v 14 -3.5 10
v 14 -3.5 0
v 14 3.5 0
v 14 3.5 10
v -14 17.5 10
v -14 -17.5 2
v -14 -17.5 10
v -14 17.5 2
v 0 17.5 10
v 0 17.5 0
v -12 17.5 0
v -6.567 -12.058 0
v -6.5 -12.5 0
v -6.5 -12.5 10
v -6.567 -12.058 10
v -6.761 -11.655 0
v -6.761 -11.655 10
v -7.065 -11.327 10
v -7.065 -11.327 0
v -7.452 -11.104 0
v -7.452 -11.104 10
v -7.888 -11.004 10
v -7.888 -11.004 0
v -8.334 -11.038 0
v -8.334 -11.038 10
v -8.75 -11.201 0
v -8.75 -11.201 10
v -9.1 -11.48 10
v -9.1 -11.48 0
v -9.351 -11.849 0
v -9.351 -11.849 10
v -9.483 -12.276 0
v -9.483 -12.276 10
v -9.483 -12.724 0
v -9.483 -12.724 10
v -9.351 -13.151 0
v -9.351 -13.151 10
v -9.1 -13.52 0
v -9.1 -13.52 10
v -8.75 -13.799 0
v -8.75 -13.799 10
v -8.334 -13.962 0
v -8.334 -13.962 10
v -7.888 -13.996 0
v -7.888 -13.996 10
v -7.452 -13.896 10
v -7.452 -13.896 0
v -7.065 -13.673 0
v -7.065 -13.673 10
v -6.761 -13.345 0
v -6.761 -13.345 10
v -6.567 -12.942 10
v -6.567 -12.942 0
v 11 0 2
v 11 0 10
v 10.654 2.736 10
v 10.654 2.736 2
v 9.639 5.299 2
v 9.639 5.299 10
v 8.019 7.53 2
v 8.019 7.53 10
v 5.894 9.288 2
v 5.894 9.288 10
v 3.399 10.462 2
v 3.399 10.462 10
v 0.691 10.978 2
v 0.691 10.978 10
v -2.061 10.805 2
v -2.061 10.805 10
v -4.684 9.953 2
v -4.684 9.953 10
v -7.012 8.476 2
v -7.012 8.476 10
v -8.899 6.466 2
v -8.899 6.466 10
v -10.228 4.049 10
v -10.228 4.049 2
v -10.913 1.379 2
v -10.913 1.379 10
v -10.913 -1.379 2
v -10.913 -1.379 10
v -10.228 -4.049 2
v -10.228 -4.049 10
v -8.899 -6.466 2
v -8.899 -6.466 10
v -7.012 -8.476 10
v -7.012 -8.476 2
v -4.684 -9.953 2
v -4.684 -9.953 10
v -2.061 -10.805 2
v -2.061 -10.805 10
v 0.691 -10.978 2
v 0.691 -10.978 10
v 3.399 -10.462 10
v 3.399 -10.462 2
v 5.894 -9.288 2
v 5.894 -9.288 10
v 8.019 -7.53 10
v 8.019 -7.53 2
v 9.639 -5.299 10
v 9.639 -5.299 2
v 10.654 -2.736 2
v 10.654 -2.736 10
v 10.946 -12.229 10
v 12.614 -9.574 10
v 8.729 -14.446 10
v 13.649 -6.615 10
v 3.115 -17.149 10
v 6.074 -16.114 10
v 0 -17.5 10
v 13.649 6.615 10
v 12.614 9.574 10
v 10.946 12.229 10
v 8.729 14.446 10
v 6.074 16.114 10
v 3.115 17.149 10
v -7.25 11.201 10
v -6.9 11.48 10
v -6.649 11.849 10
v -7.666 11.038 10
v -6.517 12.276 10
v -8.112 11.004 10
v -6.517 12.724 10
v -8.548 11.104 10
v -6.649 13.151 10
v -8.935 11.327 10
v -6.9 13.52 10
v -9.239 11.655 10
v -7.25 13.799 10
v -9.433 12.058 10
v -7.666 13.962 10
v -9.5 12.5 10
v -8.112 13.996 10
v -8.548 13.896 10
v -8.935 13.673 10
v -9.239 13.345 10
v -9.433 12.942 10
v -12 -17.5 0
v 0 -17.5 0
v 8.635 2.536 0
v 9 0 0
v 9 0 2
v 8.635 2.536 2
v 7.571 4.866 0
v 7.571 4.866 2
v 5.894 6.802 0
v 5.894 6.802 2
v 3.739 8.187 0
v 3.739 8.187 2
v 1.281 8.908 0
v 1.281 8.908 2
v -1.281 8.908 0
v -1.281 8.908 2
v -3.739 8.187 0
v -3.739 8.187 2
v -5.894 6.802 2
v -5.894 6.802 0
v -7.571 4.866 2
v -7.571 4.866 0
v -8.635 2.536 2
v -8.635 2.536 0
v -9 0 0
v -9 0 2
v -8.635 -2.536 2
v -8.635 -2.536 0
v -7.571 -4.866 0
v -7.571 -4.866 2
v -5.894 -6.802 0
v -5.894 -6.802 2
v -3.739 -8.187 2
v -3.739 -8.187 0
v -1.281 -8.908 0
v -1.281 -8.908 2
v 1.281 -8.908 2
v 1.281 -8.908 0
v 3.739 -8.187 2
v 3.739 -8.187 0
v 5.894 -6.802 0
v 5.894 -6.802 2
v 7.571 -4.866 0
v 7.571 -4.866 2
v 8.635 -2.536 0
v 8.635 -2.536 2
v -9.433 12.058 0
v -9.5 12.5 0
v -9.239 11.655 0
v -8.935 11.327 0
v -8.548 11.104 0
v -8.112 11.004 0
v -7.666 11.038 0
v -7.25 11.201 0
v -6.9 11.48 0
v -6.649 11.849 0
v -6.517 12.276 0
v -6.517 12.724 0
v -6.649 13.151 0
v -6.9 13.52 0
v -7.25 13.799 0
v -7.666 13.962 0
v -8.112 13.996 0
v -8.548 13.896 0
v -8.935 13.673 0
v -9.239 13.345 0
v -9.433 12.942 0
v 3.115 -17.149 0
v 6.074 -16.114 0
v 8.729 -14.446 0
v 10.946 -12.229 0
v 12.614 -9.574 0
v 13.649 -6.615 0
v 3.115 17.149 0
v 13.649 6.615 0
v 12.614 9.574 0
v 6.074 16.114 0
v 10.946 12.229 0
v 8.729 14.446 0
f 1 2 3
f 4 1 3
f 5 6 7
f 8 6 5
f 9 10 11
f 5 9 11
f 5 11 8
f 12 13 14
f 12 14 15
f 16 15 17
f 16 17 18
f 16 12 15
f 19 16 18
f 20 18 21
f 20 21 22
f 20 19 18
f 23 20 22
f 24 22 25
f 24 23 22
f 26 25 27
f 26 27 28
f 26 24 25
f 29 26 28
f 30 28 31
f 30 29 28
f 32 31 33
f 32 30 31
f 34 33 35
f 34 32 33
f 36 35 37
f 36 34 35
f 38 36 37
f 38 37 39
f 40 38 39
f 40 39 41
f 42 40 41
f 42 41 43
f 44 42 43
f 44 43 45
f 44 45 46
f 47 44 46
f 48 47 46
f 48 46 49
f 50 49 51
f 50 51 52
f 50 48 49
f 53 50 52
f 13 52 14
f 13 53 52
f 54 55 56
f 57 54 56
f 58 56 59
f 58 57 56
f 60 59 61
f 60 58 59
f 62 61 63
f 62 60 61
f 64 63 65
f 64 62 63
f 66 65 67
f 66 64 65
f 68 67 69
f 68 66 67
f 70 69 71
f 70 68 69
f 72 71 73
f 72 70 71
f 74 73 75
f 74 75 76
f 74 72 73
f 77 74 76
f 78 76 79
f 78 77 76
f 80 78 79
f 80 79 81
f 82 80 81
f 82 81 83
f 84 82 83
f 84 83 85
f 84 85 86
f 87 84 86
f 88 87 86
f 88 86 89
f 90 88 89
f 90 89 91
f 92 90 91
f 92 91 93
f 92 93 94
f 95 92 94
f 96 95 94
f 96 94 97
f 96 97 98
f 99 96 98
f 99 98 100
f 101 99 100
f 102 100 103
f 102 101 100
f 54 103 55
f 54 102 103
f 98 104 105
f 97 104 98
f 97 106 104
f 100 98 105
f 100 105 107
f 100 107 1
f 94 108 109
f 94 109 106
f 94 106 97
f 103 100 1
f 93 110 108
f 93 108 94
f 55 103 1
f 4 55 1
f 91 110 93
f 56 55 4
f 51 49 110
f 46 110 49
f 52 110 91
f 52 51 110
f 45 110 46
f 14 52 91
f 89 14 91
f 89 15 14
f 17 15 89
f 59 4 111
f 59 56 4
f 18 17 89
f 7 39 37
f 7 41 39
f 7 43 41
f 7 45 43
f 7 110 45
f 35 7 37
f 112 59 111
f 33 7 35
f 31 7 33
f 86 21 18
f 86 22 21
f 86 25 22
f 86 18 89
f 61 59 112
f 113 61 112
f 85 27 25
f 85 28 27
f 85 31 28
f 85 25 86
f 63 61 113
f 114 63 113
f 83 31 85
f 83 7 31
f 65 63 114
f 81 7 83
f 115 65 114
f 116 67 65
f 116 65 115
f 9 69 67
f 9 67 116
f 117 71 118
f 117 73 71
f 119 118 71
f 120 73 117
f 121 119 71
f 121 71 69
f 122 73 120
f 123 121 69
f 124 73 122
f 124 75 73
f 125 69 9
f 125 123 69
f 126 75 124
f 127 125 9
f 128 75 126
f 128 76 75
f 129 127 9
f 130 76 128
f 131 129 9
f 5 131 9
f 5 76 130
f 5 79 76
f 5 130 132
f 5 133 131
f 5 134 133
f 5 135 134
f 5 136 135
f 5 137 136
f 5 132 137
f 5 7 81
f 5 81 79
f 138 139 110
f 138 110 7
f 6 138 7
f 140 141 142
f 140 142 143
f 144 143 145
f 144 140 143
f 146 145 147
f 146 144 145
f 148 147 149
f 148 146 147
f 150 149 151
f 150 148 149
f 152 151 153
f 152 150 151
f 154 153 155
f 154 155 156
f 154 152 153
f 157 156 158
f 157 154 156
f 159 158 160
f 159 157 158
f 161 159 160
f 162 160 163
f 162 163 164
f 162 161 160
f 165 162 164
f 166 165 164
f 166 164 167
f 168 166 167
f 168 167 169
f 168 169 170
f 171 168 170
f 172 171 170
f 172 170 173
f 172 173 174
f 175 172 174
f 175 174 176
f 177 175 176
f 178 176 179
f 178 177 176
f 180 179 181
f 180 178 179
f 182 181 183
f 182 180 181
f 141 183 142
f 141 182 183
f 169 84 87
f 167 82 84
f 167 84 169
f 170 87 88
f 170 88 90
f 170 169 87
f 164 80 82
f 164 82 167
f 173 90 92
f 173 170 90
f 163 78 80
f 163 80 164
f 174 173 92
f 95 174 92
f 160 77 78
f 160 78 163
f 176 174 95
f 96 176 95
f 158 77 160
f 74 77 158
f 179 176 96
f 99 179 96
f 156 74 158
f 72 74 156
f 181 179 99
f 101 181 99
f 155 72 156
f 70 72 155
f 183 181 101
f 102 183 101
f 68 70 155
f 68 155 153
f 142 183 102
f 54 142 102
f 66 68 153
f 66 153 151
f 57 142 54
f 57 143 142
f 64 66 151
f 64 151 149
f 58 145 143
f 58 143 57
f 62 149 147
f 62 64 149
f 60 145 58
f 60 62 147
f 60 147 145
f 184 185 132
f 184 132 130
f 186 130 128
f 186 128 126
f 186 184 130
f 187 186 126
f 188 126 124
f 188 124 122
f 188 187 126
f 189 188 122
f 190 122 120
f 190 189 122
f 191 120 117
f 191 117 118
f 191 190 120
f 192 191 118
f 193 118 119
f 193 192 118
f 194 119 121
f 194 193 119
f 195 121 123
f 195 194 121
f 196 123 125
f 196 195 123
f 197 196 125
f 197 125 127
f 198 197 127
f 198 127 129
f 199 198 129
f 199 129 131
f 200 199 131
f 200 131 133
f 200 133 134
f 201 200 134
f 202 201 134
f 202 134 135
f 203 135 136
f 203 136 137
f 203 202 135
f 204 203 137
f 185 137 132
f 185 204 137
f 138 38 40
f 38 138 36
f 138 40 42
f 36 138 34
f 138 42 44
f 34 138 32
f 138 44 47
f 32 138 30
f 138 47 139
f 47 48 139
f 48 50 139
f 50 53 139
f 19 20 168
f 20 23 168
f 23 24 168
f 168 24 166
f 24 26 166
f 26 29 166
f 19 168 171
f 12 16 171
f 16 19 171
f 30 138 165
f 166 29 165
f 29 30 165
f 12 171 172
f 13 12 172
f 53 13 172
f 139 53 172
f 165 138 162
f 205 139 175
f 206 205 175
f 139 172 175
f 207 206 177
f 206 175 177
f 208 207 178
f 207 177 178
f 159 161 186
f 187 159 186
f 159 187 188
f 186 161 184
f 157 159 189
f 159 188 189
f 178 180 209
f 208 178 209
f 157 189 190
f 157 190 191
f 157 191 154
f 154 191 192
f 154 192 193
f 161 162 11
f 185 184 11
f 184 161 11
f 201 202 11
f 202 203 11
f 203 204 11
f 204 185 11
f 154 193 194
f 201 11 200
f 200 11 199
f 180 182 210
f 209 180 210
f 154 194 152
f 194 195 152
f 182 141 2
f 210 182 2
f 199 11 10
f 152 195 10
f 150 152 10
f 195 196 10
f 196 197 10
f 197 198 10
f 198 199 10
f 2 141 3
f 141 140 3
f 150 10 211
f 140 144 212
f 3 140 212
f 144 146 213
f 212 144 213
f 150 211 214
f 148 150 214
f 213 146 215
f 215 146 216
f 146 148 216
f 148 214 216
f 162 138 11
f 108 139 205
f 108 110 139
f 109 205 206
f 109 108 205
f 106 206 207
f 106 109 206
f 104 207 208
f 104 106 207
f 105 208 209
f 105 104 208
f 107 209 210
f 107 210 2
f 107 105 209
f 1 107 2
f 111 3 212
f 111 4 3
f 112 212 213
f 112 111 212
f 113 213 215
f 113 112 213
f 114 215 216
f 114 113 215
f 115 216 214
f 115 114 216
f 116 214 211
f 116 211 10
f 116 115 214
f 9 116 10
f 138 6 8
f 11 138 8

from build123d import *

# Parameters (mm, degrees)
CROQUIS1_W              = 35
CROQUIS1_H              = 28
CROQUIS1_R              = 11
CROQUIS1_R_2            = 1.5
SALIENTE_EXTRUIR1_DEPTH = 10
CROQUIS2_R              = 11
CROQUIS2_R_2            = 9
SALIENTE_EXTRUIR2_DEPTH = 2
REDONDEO1_R             = 14
CHAFL_N1_SIZE           = 2


with BuildPart() as part:
    # Croquis1 → Saliente-Extruir1 (new body)
    with BuildSketch(Plane(origin=(0, 0, 0), x_dir=(0, 1, 0), z_dir=(0, 0, 1))):
        Rectangle(CROQUIS1_W, CROQUIS1_H)
        with Locations(Location((0, 0, 0), (0, 0, 270))):
            Circle(CROQUIS1_R, mode=Mode.SUBTRACT)
        with Locations(Location((-12.5, 8, 0), (0, 0, 270))):
            Circle(CROQUIS1_R_2, mode=Mode.SUBTRACT)
        with Locations(Location((12.5, 8, 0), (0, 0, 90))):
            Circle(CROQUIS1_R_2, mode=Mode.SUBTRACT)
    extrude(amount=SALIENTE_EXTRUIR1_DEPTH)

    # Croquis2 → Saliente-Extruir2 (add)
    with BuildSketch(Plane(origin=(0, 0, 0), x_dir=(0, 1, 0), z_dir=(0, 0, 1))):
        with Locations(Location((0, 0, 0), (0, 0, 270))):
            Circle(CROQUIS2_R)
        with Locations(Location((0, 0, 0), (0, 0, 270))):
            Circle(CROQUIS2_R_2, mode=Mode.SUBTRACT)
    extrude(amount=SALIENTE_EXTRUIR2_DEPTH)

    # Redondeo1
    redondeo1_edges = [part.edges().sort_by_distance(p)[0] for p in [
        (14, 17.5, 5),
        (14, -17.5, 5),
    ]]
    fillet(redondeo1_edges, radius=REDONDEO1_R)

    # Chaflán1
    chafl_n1_edges = [part.edges().sort_by_distance(p)[0] for p in [
        (-14, 0, 0),
    ]]
    chamfer(chafl_n1_edges, length=CHAFL_N1_SIZE)


solid = part.part
